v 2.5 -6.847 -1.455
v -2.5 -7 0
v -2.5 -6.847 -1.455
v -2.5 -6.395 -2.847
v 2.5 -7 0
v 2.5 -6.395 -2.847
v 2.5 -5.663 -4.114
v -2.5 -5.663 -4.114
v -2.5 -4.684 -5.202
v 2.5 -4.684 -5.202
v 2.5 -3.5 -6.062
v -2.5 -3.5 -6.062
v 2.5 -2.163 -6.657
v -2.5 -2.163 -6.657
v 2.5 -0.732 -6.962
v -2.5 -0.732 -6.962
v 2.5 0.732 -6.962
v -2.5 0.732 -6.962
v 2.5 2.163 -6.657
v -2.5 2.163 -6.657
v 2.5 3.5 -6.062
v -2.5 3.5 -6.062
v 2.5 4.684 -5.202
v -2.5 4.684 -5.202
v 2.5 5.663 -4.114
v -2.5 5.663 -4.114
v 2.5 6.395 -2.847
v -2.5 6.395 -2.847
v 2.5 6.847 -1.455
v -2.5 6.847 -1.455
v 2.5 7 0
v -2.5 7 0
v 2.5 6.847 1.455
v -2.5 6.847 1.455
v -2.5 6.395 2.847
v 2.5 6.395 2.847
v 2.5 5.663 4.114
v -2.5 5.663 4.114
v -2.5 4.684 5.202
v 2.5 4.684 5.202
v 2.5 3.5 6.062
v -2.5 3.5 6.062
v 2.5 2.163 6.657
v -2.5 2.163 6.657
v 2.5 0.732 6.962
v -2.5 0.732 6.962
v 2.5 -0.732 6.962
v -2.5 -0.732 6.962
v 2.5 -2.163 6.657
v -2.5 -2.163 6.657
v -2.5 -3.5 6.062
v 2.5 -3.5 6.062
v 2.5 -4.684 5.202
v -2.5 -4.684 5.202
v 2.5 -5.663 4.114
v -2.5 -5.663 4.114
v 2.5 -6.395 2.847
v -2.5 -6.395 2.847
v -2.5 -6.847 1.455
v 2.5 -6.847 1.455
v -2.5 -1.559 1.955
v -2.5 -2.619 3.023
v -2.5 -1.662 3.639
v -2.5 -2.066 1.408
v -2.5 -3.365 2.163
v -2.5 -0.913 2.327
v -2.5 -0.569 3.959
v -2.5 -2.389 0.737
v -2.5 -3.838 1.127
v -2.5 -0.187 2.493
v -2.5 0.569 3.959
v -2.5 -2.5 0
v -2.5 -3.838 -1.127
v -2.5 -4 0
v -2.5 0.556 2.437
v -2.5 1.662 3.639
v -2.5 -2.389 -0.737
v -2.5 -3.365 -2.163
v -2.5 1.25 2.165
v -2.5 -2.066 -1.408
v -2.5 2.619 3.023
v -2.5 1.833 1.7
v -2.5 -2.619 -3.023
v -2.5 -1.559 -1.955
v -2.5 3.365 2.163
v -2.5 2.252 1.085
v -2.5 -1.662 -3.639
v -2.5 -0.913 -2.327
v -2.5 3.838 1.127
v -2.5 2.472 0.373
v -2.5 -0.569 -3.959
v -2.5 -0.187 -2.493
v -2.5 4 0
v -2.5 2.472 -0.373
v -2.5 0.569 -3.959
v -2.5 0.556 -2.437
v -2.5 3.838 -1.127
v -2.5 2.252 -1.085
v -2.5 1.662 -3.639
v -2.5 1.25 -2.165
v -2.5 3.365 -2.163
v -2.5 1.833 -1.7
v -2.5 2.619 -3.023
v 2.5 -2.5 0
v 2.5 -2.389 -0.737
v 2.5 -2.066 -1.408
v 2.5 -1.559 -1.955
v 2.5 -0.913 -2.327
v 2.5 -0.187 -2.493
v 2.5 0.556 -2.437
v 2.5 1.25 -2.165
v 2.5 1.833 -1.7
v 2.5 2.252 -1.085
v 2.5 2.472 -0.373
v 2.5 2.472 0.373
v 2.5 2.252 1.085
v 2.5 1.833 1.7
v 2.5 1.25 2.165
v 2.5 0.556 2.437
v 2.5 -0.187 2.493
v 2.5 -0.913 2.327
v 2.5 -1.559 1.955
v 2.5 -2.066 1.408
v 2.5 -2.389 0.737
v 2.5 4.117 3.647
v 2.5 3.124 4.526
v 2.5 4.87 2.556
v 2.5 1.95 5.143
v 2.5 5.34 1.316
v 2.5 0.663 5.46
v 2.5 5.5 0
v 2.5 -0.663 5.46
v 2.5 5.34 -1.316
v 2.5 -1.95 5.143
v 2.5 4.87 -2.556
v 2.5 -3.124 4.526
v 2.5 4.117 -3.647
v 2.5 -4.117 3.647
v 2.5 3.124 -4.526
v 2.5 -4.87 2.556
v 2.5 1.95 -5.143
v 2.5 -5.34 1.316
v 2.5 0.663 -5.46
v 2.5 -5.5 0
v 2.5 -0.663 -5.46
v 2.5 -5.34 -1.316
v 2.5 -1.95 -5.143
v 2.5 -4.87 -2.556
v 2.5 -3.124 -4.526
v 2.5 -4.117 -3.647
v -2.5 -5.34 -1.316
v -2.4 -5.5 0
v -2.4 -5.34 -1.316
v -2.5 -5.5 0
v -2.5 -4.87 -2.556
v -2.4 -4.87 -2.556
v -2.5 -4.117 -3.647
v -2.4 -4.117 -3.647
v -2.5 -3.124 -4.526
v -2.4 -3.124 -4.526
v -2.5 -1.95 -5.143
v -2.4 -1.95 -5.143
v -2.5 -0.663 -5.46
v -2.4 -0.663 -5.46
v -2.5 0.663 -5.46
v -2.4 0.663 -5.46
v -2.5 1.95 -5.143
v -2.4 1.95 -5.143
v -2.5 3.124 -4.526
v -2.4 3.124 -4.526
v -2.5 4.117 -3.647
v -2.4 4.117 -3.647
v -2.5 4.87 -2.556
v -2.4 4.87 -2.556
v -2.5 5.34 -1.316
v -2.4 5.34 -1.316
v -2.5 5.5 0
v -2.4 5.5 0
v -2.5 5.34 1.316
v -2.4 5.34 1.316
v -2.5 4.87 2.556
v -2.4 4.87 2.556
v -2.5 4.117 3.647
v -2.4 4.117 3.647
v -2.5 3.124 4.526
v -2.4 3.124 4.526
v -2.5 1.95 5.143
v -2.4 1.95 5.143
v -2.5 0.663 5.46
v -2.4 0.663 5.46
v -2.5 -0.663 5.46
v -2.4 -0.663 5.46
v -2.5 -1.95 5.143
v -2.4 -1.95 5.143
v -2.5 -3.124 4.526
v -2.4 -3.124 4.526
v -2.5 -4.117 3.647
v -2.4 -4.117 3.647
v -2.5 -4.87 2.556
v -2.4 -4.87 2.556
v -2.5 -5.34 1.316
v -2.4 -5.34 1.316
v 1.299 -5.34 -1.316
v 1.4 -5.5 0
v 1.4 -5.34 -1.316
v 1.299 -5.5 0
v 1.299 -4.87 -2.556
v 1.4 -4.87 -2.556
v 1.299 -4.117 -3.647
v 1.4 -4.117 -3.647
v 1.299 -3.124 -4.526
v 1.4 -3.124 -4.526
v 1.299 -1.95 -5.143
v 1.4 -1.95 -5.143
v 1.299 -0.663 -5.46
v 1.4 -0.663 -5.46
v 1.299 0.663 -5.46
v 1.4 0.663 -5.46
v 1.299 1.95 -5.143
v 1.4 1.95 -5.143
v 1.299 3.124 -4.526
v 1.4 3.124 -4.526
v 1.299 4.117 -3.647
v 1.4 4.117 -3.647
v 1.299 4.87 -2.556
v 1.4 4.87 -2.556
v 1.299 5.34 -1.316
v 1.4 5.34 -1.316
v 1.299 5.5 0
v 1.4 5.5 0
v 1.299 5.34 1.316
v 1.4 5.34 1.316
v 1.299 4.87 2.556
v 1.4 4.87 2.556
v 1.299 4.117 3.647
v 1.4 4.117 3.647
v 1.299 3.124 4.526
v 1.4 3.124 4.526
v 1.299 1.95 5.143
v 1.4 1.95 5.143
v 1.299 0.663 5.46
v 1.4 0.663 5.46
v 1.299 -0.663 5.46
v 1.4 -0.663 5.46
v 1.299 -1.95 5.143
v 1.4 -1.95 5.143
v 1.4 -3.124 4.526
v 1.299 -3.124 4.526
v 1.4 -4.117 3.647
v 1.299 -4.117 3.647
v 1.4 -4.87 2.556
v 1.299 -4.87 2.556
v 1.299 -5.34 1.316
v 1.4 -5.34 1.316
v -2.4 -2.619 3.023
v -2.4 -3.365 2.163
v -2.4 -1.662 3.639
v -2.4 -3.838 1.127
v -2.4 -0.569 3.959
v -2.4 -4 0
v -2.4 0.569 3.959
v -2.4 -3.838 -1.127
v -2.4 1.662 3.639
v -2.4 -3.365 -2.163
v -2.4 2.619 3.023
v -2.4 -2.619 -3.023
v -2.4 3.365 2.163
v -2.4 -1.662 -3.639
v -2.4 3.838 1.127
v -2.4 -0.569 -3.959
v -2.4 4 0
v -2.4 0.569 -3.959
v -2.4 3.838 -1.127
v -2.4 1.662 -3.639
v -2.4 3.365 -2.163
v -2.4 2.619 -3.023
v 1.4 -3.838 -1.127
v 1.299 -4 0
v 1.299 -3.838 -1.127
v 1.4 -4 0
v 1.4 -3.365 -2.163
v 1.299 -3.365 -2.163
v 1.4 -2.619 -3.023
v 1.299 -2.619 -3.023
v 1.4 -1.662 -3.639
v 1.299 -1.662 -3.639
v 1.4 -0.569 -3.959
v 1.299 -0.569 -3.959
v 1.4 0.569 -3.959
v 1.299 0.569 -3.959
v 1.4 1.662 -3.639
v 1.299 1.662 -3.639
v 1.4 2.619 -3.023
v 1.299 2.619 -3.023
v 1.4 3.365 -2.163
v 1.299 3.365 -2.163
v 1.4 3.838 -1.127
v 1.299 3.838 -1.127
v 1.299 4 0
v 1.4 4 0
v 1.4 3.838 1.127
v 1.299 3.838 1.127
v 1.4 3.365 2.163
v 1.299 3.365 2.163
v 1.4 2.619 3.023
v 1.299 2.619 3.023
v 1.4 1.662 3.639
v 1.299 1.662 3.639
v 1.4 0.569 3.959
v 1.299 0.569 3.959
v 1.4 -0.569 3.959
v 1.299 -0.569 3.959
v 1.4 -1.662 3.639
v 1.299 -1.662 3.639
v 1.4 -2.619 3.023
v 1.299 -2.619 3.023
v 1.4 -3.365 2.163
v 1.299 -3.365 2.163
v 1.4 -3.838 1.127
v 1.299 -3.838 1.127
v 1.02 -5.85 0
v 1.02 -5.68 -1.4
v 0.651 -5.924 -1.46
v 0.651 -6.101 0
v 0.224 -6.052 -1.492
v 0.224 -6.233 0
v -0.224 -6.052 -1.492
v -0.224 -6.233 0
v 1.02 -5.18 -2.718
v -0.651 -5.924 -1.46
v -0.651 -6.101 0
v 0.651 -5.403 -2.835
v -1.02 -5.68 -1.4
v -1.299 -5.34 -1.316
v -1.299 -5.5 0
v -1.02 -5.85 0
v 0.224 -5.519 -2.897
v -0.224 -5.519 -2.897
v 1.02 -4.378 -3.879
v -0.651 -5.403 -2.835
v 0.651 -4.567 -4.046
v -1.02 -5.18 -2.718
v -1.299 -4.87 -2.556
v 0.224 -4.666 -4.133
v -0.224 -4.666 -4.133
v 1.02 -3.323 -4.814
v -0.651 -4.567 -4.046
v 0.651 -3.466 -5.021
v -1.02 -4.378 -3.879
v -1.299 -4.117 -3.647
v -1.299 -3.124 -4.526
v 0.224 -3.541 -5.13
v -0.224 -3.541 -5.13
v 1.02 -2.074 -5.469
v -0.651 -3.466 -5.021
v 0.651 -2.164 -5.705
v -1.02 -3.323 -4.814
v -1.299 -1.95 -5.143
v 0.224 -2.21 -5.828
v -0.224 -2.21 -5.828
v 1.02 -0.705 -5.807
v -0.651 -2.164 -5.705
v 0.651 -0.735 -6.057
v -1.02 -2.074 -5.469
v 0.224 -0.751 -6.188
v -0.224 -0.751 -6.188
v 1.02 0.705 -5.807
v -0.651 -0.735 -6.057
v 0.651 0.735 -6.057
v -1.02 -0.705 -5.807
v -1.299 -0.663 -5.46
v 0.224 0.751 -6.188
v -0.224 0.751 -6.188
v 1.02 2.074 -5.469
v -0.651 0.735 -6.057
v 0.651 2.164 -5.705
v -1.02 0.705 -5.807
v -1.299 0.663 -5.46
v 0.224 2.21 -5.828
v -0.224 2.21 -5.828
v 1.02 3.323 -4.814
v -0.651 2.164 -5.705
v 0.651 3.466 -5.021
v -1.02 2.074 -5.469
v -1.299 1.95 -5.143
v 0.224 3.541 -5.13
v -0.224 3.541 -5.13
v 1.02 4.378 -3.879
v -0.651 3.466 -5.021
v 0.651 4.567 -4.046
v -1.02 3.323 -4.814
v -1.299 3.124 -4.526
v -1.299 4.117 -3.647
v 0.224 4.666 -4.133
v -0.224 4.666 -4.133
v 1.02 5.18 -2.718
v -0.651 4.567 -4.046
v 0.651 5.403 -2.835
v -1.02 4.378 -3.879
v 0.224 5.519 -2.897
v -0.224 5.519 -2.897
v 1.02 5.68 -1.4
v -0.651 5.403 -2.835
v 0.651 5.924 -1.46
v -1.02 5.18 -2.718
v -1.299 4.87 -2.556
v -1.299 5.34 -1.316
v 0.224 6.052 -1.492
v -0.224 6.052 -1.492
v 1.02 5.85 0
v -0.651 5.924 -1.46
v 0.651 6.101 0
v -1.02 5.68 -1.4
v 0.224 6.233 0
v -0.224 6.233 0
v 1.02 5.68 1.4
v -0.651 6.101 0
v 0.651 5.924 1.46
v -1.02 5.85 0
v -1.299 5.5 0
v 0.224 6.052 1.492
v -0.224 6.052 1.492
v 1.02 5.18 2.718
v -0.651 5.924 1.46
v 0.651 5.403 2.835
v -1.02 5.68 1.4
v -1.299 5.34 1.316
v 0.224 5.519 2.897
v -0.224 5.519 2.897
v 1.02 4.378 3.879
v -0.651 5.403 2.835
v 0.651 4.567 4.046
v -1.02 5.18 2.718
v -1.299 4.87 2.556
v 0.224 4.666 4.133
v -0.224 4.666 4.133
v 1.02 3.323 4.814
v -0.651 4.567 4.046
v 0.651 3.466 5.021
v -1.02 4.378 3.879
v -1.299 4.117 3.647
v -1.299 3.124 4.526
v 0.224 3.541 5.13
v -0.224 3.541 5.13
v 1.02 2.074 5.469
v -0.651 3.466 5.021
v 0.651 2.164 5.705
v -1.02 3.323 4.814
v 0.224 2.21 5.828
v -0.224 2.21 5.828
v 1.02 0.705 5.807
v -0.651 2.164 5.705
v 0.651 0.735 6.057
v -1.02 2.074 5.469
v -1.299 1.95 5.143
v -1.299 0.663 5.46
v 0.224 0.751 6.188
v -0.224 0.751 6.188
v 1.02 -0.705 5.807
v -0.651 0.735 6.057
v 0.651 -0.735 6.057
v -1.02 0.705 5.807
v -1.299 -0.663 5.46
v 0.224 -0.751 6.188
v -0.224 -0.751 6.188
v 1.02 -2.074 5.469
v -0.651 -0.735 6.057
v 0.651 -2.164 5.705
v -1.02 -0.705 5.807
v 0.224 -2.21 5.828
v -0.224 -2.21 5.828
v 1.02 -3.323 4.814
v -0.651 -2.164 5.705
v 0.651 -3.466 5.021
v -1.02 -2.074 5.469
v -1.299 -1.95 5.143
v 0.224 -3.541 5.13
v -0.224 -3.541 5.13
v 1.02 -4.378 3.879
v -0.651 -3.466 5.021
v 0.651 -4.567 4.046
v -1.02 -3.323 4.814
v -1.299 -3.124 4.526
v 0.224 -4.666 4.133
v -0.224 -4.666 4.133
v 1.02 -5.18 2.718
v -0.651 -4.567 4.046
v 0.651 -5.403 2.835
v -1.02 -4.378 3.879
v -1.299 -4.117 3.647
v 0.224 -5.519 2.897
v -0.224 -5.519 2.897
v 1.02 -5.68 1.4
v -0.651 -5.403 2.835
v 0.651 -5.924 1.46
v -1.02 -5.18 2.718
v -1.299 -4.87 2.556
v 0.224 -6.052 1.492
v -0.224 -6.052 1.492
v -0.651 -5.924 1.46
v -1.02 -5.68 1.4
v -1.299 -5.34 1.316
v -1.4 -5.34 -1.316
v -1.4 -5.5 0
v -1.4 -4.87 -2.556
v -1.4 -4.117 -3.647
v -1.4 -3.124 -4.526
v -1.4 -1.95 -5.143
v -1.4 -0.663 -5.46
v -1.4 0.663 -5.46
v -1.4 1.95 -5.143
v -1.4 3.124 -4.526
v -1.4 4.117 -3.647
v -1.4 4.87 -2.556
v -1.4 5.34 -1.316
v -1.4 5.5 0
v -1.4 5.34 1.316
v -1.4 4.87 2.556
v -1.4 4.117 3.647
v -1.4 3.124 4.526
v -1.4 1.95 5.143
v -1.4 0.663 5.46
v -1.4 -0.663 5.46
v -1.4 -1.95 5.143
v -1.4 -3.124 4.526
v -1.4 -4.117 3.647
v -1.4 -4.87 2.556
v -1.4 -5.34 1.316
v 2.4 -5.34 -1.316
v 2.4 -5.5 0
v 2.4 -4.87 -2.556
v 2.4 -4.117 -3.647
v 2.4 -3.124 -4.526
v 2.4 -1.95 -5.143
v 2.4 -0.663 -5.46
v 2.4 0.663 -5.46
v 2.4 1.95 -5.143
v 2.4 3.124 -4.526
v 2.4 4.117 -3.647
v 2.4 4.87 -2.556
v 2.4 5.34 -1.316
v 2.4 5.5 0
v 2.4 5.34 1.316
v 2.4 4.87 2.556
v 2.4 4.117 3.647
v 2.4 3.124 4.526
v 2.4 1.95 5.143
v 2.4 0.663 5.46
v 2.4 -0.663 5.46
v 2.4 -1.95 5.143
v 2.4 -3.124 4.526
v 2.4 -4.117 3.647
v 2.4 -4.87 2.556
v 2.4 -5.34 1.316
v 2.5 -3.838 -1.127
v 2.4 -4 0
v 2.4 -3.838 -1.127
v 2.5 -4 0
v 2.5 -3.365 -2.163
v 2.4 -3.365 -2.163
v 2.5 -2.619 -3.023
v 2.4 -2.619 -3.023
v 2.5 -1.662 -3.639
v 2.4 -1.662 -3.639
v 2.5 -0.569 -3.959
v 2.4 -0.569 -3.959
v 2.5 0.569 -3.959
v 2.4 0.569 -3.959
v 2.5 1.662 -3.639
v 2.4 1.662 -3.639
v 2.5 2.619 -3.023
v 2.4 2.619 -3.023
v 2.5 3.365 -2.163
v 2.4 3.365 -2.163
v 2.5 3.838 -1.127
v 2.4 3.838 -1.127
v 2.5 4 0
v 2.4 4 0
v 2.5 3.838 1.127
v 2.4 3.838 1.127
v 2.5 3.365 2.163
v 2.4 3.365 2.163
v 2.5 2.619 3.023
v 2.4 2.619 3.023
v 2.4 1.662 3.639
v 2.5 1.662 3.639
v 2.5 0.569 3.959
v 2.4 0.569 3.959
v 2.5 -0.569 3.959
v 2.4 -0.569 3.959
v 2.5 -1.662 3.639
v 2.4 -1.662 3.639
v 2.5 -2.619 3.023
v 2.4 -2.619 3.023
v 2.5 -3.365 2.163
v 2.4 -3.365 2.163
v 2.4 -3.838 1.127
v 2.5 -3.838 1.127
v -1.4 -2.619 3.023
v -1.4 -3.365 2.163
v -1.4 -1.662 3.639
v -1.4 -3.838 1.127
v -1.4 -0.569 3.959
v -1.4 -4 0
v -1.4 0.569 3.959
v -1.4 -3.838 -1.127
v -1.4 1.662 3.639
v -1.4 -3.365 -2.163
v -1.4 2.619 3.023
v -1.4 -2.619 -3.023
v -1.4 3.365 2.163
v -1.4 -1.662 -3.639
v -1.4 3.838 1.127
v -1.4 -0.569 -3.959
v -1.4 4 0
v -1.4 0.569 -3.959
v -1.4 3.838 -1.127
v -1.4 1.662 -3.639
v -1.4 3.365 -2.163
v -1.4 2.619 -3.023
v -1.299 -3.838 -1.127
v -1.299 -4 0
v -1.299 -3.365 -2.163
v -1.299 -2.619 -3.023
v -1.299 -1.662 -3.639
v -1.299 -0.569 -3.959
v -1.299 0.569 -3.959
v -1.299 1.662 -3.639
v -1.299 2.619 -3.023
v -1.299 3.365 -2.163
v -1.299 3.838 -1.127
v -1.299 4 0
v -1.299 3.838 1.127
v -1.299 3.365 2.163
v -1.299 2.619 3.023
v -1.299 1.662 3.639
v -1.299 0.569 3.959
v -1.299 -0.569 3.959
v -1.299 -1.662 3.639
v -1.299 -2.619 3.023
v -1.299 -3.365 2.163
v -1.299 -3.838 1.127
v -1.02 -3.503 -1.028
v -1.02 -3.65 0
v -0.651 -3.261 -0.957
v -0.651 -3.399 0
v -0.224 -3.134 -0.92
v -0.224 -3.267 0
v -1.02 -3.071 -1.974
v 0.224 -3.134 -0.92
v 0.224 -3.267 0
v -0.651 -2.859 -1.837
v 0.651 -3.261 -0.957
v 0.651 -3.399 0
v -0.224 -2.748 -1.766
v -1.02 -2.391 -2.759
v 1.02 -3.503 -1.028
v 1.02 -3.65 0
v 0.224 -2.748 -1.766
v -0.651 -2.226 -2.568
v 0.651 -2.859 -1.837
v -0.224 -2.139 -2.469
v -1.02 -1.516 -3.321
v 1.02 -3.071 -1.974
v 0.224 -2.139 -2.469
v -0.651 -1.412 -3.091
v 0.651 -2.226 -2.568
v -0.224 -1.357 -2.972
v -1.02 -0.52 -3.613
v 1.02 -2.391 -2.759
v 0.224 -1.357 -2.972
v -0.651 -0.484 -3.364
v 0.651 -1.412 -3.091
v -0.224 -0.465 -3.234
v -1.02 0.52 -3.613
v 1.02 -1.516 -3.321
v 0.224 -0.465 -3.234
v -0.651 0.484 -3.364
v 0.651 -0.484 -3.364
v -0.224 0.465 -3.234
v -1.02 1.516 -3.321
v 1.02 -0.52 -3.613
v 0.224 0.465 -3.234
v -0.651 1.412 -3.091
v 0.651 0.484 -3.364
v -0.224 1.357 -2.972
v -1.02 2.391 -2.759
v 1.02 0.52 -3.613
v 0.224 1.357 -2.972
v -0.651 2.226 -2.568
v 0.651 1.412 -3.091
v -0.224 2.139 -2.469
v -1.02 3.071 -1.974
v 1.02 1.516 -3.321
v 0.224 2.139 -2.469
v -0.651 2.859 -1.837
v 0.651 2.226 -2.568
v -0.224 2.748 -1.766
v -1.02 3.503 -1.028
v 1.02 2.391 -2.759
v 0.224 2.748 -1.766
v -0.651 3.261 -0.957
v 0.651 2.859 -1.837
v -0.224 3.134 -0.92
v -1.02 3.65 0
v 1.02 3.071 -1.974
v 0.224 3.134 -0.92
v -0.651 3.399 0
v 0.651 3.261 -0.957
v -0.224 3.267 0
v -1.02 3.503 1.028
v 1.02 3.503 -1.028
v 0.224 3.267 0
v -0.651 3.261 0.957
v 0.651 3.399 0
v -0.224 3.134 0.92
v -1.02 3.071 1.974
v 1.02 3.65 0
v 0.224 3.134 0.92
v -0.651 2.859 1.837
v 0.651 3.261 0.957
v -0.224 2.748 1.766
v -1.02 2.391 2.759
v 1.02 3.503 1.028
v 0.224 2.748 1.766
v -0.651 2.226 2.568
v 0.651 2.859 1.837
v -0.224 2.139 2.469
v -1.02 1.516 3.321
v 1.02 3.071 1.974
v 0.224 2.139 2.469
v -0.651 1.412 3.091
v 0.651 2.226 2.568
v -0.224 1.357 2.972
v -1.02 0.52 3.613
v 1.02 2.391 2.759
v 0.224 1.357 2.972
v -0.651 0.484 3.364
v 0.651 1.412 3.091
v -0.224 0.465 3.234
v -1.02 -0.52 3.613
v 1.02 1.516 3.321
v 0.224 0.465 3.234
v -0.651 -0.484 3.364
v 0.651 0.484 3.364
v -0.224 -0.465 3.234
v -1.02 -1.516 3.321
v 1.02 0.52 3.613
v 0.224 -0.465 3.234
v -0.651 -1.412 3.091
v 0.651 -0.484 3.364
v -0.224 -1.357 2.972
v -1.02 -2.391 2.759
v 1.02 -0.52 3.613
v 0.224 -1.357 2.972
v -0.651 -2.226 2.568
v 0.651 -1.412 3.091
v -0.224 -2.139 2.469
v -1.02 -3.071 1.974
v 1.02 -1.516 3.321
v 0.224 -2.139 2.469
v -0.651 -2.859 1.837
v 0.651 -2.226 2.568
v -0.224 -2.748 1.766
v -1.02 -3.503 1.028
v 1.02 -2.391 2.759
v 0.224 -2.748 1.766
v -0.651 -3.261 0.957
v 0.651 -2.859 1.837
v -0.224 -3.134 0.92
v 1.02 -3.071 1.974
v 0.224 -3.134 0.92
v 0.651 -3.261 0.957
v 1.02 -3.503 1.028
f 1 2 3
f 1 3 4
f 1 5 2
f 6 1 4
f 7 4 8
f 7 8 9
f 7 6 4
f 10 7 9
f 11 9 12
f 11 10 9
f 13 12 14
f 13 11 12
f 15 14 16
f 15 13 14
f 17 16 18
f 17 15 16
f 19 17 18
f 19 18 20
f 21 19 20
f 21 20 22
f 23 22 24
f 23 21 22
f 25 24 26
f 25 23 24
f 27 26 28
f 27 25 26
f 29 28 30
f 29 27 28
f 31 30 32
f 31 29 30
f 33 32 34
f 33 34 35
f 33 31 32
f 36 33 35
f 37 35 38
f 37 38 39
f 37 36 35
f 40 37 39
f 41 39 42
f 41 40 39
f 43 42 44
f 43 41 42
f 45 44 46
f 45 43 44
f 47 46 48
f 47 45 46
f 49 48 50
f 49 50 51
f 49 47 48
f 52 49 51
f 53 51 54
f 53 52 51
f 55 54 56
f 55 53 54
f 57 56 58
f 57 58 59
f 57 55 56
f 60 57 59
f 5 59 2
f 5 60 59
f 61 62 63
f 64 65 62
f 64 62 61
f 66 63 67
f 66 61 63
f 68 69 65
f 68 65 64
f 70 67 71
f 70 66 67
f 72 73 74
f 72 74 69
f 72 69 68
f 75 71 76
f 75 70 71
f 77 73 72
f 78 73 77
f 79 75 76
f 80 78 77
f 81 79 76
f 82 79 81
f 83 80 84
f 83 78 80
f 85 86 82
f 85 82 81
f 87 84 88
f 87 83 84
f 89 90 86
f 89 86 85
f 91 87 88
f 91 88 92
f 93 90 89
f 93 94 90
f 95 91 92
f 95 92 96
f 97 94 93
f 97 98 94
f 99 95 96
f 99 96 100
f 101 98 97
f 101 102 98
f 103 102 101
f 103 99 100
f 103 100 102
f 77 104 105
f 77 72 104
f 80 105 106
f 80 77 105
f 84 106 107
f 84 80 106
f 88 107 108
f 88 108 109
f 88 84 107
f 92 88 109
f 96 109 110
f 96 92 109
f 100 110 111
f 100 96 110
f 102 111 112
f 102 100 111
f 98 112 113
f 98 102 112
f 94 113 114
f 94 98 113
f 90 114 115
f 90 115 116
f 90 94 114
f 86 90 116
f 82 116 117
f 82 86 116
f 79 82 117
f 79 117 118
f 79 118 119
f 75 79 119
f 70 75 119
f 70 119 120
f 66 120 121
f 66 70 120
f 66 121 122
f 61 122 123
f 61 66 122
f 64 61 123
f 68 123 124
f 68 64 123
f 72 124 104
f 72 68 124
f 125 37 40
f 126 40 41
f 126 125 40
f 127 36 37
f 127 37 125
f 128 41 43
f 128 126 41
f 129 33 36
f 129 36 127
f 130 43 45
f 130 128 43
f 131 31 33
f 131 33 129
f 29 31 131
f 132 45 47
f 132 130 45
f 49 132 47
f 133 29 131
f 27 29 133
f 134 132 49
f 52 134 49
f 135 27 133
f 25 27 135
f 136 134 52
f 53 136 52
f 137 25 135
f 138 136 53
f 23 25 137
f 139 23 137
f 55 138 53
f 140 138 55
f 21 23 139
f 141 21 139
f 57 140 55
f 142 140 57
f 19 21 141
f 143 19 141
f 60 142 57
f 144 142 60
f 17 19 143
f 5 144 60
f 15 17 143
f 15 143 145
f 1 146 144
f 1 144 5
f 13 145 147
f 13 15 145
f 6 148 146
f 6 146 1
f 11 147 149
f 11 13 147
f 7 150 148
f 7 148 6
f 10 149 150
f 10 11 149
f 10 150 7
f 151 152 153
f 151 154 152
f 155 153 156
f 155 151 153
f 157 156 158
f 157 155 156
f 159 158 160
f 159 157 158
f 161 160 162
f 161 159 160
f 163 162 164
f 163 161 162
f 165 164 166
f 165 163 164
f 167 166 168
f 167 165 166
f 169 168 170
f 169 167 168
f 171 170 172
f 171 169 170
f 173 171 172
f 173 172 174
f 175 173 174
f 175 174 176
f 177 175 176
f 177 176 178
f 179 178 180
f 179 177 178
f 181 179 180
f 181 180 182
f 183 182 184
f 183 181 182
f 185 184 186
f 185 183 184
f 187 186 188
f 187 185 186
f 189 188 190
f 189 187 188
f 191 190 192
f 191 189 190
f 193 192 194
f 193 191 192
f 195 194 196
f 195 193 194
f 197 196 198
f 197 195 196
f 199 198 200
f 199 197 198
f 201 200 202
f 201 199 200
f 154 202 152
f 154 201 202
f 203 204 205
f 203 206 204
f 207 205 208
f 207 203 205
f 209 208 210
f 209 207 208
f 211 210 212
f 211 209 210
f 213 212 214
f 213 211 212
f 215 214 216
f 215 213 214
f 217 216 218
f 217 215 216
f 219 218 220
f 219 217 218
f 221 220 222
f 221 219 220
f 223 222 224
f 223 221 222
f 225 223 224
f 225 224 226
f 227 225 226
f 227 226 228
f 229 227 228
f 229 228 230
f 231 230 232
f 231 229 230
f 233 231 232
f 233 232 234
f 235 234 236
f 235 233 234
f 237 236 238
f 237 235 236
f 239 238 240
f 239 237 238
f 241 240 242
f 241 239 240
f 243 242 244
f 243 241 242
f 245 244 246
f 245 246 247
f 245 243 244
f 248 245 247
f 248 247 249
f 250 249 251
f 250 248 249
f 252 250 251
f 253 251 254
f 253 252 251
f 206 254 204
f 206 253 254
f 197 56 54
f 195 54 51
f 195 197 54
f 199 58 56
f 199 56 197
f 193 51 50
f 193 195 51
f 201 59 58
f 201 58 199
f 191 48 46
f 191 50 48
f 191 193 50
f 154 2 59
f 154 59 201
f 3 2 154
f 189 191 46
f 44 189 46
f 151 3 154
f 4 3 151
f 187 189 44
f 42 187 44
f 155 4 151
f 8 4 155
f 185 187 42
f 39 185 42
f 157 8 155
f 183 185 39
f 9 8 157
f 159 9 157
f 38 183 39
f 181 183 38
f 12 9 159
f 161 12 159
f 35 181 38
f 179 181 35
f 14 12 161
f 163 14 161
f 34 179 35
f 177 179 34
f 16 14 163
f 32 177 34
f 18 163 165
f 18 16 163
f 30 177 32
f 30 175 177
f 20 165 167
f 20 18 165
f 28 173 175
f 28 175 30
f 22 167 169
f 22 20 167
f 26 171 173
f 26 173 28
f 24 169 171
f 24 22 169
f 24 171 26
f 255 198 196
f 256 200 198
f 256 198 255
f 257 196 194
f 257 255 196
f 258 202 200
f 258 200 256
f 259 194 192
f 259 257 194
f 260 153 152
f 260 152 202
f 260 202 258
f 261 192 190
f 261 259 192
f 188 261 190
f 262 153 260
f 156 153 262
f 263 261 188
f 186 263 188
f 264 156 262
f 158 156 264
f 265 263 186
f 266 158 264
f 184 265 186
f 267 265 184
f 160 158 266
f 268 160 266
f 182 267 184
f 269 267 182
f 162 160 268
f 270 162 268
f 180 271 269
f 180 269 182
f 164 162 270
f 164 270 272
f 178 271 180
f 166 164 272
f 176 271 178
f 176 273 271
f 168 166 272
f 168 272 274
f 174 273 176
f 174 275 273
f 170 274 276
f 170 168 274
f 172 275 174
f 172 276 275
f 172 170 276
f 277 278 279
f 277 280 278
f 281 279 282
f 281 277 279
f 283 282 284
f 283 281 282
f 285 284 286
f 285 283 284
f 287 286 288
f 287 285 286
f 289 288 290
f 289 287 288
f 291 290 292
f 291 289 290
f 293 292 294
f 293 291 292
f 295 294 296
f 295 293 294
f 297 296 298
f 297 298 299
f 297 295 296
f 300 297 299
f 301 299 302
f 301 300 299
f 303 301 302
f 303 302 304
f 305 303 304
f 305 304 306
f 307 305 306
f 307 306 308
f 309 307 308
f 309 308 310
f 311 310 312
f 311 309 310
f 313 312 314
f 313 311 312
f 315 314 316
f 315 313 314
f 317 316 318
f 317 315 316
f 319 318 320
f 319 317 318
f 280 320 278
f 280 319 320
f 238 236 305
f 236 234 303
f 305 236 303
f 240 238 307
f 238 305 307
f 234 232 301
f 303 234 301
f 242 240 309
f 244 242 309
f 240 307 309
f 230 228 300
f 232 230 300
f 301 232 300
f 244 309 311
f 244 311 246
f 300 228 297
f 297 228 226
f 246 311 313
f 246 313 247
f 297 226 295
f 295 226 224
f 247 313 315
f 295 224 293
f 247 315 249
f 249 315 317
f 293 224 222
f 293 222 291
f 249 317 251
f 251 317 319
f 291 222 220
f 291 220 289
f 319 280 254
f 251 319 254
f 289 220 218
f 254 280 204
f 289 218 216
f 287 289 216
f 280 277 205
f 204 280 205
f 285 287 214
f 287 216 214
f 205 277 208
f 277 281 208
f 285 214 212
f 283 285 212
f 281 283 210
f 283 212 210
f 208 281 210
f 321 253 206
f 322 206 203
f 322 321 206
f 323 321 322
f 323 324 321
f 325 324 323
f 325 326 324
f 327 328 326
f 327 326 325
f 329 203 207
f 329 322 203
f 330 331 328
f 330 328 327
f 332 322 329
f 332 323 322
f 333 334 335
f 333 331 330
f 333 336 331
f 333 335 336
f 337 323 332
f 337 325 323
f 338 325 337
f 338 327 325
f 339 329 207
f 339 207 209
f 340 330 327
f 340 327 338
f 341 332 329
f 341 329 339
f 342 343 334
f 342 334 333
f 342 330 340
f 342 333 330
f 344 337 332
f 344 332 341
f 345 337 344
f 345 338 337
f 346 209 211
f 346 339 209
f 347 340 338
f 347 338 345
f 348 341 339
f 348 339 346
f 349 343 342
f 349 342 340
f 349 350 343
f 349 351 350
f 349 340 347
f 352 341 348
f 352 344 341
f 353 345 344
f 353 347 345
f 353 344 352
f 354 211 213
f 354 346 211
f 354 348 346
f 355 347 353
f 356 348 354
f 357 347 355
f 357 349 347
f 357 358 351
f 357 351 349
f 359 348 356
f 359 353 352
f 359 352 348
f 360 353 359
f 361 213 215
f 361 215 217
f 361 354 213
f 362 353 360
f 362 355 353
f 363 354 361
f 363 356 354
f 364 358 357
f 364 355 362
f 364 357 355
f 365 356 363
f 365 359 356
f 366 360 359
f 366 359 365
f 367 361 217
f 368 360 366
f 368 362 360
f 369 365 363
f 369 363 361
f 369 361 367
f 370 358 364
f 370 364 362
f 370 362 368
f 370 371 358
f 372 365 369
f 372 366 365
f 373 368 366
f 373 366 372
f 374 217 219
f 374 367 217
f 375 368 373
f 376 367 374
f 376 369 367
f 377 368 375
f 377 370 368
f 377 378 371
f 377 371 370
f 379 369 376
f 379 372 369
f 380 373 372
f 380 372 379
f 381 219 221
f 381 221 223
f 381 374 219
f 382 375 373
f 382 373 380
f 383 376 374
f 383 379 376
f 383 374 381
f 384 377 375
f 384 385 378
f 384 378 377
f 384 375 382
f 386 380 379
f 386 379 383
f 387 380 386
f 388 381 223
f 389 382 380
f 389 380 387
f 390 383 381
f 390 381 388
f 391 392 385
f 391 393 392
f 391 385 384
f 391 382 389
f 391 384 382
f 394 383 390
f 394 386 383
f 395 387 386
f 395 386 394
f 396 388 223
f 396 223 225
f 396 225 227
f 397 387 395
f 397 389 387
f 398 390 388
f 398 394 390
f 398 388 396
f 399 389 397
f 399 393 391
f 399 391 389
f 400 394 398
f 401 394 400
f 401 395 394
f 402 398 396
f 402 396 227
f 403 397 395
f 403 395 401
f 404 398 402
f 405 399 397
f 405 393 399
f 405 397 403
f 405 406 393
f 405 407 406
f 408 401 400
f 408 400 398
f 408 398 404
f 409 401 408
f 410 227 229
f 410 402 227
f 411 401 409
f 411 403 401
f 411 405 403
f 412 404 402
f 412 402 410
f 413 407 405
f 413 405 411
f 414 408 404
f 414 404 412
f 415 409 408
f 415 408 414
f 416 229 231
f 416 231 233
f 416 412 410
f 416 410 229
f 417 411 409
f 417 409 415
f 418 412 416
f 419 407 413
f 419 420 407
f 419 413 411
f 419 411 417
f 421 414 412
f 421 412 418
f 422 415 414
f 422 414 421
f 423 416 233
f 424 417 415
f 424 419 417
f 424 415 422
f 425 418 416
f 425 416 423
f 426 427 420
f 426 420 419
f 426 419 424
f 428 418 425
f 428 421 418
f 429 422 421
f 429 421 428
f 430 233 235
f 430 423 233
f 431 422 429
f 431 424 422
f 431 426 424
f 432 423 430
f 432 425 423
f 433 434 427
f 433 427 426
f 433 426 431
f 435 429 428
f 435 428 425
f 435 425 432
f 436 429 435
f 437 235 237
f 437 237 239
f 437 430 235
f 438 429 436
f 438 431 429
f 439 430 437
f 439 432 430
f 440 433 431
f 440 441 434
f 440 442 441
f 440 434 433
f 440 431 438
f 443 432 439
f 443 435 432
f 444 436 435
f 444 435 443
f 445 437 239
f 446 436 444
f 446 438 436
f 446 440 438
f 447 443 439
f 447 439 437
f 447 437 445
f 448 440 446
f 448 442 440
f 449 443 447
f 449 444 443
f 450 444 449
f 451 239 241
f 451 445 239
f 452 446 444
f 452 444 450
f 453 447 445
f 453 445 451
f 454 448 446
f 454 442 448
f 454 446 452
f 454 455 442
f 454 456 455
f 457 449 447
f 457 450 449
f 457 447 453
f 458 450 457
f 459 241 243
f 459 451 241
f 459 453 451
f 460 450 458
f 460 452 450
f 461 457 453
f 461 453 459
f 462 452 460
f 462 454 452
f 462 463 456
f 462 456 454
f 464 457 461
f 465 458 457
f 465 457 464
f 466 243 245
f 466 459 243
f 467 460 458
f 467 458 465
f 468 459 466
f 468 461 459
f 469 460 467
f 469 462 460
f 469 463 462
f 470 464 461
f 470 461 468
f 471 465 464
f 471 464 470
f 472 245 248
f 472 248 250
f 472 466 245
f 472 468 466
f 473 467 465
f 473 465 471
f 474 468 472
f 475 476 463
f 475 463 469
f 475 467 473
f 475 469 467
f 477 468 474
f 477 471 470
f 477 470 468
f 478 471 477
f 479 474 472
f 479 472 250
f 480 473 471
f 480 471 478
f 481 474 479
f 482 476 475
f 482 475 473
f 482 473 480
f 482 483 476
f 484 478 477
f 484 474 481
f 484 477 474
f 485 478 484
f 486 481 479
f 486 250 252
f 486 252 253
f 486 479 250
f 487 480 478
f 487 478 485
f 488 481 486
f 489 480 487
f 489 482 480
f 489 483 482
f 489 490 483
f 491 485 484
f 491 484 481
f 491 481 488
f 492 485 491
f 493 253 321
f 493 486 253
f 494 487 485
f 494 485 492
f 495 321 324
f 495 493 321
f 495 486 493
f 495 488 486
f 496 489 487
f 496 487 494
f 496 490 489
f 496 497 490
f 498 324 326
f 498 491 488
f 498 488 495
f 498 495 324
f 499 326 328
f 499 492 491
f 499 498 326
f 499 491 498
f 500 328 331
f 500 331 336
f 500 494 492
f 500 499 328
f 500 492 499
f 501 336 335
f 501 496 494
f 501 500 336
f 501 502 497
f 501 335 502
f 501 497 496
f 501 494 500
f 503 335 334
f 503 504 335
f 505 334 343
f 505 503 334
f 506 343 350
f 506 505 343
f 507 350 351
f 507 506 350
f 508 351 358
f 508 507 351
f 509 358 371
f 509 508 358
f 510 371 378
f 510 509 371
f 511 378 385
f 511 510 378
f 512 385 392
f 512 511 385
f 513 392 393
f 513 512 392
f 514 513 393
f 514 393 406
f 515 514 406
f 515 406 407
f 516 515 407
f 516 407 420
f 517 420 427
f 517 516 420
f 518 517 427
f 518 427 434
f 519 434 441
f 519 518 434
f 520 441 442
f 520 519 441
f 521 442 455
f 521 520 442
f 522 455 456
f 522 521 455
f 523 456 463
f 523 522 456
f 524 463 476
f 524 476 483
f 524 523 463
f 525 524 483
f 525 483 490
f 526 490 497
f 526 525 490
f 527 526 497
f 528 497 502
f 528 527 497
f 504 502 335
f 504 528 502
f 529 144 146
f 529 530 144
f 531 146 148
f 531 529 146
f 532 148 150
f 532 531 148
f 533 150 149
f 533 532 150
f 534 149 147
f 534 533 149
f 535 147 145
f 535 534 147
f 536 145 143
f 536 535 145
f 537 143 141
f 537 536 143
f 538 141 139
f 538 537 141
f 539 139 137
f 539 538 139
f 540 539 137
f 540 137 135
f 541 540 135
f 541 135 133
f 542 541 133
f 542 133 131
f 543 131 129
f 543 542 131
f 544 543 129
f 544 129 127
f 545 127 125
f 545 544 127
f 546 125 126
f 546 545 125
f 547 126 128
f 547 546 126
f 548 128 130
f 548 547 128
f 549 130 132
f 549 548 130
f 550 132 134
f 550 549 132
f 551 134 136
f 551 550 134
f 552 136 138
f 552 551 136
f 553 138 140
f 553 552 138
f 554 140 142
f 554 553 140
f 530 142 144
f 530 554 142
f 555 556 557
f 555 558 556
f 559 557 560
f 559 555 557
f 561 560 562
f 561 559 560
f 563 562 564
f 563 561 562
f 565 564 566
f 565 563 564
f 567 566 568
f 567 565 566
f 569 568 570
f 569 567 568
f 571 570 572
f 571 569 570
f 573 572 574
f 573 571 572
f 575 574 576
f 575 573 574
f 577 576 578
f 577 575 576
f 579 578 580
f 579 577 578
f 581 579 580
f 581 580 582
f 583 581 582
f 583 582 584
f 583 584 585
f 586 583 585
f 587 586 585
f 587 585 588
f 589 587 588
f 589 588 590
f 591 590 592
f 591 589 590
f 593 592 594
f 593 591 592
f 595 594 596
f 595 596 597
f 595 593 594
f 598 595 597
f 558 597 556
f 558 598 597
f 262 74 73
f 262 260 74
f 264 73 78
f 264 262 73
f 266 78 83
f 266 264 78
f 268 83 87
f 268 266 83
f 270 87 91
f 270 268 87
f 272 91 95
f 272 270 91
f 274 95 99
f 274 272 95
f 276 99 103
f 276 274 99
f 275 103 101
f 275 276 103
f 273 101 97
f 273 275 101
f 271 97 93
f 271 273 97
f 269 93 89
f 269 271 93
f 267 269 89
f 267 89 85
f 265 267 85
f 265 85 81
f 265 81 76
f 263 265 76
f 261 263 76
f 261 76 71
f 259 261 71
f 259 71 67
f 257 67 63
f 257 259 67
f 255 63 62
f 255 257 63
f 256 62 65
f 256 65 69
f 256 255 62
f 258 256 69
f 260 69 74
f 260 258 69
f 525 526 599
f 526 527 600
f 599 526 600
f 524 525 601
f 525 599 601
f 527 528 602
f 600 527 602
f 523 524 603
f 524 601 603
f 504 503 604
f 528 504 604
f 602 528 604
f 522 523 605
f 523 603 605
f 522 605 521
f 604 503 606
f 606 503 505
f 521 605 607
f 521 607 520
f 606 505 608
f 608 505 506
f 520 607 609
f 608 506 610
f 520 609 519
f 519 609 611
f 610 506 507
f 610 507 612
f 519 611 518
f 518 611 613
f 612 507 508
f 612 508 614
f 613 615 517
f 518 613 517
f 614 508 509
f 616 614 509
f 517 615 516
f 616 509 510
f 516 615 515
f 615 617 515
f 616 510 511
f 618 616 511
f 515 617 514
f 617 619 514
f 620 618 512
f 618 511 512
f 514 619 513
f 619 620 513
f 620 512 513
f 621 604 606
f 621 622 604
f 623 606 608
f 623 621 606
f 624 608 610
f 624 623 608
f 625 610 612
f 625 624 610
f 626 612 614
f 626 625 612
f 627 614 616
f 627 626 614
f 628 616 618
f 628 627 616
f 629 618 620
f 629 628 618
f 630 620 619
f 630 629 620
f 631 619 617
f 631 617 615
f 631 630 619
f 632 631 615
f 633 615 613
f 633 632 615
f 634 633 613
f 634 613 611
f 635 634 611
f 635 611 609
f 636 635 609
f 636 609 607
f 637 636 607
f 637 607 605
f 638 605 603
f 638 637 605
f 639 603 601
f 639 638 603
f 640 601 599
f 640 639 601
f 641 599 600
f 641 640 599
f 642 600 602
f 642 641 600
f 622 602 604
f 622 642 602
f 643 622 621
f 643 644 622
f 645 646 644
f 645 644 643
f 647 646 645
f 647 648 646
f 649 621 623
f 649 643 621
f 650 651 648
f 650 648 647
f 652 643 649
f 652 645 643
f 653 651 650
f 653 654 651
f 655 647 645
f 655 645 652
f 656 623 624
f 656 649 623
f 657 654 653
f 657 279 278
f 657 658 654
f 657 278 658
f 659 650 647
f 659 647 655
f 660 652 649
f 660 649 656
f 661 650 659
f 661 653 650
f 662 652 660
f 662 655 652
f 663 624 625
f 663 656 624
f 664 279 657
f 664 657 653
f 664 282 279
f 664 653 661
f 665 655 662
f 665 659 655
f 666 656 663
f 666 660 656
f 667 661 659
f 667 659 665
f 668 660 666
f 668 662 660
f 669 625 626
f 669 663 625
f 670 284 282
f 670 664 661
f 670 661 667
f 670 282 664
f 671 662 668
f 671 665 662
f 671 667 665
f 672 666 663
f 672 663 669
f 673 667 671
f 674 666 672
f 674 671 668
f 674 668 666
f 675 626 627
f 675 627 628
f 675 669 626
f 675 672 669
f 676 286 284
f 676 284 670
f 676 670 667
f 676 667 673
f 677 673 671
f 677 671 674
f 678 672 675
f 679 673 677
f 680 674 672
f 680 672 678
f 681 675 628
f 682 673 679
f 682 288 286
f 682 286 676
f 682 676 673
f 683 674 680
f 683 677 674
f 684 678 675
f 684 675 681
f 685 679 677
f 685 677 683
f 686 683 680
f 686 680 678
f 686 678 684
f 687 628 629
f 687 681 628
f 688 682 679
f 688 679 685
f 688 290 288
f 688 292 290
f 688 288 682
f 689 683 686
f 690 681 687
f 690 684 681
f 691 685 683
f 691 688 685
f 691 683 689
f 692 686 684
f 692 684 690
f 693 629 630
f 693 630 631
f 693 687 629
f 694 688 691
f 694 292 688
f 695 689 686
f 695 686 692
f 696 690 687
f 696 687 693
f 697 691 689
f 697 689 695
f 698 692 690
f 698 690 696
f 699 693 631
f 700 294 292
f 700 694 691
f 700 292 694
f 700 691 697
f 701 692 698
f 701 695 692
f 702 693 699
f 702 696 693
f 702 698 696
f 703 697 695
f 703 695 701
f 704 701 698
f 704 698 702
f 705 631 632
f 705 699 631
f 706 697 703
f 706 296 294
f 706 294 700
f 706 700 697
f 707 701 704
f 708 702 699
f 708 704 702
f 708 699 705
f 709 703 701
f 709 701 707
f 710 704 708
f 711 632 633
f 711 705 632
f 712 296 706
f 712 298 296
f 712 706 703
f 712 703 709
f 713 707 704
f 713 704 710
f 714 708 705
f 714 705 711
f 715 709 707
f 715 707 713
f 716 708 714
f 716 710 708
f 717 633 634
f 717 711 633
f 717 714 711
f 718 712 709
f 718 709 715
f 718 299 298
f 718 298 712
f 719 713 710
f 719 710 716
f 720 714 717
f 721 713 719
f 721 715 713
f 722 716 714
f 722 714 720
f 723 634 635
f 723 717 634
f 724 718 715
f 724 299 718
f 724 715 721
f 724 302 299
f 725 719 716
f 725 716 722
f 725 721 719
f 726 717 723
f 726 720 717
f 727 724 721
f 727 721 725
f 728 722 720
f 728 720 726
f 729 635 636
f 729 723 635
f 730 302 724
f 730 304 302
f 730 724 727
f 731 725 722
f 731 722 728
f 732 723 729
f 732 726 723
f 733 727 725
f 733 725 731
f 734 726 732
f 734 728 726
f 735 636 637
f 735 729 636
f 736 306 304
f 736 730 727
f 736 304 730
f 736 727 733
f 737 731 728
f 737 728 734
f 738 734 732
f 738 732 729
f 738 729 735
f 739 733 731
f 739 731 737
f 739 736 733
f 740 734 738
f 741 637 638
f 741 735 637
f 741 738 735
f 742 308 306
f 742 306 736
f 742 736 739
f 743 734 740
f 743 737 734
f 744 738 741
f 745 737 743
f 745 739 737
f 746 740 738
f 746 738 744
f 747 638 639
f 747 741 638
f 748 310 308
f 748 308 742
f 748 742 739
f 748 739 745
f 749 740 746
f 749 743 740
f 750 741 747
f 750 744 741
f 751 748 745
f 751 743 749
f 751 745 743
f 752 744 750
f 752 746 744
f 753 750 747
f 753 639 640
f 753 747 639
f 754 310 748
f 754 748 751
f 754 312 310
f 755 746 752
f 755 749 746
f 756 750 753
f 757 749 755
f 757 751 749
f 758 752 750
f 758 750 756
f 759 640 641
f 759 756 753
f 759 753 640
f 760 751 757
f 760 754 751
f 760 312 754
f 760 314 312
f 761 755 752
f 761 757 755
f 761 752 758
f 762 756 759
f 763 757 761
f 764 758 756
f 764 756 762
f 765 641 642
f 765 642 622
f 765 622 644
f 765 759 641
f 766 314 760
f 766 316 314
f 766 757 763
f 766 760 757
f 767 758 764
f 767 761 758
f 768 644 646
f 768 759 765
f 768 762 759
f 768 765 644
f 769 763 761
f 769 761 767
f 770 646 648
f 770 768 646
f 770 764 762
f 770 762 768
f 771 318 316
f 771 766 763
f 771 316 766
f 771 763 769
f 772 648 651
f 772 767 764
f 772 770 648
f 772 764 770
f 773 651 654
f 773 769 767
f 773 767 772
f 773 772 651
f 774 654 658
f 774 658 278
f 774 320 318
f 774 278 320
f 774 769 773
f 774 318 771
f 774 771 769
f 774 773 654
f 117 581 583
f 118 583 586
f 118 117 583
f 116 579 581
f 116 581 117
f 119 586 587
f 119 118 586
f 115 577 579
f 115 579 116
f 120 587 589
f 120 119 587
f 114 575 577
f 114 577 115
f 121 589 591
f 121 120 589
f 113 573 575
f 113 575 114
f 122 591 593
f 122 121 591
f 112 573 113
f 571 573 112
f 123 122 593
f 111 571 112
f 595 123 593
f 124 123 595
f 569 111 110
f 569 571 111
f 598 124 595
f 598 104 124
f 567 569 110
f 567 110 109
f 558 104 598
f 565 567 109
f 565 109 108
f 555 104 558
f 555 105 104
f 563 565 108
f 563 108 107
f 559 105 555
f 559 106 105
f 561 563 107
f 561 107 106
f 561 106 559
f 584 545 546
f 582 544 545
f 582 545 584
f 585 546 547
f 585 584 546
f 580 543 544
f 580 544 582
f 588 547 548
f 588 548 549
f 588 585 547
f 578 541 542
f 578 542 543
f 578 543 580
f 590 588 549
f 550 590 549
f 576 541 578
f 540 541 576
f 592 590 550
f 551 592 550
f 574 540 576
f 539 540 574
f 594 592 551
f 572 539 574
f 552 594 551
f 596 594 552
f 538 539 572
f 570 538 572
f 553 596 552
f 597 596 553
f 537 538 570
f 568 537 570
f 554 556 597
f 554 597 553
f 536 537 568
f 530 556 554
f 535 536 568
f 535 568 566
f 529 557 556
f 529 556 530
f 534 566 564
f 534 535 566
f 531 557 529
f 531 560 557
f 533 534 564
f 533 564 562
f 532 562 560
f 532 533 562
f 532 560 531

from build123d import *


with BuildPart() as part:
    # Sketch → Revolution (revolve)
    with BuildSketch(Plane.YX):
        Polygon((-7, 2.5), (-5.5, 2.5), (-5.5, 2.4), (-4, 2.4), (-4, 2.5), (-2.5, 2.5), (-2.5, -2.5), (-4, -2.5), (-4, -2.4), (-5.5, -2.4), (-5.5, -2.5), (-7, -2.5), align=None)
        with BuildLine():
            ThreePointArc((-5.5, 1.299038), (-6.25, 0), (-5.5, -1.299038))
            Line((-5.5, -1.299038), (-5.5, -1.4))
            Line((-4, -1.4), (-5.5, -1.4))
            Line((-4, -1.4), (-4, -1.299038))
            ThreePointArc((-4, -1.299038), (-3.25, 0), (-4, 1.299038))
            Line((-4, 1.299038), (-4, 1.4))
            Line((-5.5, 1.4), (-4, 1.4))
            Line((-5.5, 1.4), (-5.5, 1.299038))
        make_face(mode=Mode.SUBTRACT)
    revolve(axis=Axis((0, 0, 0), (1, 0, 0)))


solid = part.part
